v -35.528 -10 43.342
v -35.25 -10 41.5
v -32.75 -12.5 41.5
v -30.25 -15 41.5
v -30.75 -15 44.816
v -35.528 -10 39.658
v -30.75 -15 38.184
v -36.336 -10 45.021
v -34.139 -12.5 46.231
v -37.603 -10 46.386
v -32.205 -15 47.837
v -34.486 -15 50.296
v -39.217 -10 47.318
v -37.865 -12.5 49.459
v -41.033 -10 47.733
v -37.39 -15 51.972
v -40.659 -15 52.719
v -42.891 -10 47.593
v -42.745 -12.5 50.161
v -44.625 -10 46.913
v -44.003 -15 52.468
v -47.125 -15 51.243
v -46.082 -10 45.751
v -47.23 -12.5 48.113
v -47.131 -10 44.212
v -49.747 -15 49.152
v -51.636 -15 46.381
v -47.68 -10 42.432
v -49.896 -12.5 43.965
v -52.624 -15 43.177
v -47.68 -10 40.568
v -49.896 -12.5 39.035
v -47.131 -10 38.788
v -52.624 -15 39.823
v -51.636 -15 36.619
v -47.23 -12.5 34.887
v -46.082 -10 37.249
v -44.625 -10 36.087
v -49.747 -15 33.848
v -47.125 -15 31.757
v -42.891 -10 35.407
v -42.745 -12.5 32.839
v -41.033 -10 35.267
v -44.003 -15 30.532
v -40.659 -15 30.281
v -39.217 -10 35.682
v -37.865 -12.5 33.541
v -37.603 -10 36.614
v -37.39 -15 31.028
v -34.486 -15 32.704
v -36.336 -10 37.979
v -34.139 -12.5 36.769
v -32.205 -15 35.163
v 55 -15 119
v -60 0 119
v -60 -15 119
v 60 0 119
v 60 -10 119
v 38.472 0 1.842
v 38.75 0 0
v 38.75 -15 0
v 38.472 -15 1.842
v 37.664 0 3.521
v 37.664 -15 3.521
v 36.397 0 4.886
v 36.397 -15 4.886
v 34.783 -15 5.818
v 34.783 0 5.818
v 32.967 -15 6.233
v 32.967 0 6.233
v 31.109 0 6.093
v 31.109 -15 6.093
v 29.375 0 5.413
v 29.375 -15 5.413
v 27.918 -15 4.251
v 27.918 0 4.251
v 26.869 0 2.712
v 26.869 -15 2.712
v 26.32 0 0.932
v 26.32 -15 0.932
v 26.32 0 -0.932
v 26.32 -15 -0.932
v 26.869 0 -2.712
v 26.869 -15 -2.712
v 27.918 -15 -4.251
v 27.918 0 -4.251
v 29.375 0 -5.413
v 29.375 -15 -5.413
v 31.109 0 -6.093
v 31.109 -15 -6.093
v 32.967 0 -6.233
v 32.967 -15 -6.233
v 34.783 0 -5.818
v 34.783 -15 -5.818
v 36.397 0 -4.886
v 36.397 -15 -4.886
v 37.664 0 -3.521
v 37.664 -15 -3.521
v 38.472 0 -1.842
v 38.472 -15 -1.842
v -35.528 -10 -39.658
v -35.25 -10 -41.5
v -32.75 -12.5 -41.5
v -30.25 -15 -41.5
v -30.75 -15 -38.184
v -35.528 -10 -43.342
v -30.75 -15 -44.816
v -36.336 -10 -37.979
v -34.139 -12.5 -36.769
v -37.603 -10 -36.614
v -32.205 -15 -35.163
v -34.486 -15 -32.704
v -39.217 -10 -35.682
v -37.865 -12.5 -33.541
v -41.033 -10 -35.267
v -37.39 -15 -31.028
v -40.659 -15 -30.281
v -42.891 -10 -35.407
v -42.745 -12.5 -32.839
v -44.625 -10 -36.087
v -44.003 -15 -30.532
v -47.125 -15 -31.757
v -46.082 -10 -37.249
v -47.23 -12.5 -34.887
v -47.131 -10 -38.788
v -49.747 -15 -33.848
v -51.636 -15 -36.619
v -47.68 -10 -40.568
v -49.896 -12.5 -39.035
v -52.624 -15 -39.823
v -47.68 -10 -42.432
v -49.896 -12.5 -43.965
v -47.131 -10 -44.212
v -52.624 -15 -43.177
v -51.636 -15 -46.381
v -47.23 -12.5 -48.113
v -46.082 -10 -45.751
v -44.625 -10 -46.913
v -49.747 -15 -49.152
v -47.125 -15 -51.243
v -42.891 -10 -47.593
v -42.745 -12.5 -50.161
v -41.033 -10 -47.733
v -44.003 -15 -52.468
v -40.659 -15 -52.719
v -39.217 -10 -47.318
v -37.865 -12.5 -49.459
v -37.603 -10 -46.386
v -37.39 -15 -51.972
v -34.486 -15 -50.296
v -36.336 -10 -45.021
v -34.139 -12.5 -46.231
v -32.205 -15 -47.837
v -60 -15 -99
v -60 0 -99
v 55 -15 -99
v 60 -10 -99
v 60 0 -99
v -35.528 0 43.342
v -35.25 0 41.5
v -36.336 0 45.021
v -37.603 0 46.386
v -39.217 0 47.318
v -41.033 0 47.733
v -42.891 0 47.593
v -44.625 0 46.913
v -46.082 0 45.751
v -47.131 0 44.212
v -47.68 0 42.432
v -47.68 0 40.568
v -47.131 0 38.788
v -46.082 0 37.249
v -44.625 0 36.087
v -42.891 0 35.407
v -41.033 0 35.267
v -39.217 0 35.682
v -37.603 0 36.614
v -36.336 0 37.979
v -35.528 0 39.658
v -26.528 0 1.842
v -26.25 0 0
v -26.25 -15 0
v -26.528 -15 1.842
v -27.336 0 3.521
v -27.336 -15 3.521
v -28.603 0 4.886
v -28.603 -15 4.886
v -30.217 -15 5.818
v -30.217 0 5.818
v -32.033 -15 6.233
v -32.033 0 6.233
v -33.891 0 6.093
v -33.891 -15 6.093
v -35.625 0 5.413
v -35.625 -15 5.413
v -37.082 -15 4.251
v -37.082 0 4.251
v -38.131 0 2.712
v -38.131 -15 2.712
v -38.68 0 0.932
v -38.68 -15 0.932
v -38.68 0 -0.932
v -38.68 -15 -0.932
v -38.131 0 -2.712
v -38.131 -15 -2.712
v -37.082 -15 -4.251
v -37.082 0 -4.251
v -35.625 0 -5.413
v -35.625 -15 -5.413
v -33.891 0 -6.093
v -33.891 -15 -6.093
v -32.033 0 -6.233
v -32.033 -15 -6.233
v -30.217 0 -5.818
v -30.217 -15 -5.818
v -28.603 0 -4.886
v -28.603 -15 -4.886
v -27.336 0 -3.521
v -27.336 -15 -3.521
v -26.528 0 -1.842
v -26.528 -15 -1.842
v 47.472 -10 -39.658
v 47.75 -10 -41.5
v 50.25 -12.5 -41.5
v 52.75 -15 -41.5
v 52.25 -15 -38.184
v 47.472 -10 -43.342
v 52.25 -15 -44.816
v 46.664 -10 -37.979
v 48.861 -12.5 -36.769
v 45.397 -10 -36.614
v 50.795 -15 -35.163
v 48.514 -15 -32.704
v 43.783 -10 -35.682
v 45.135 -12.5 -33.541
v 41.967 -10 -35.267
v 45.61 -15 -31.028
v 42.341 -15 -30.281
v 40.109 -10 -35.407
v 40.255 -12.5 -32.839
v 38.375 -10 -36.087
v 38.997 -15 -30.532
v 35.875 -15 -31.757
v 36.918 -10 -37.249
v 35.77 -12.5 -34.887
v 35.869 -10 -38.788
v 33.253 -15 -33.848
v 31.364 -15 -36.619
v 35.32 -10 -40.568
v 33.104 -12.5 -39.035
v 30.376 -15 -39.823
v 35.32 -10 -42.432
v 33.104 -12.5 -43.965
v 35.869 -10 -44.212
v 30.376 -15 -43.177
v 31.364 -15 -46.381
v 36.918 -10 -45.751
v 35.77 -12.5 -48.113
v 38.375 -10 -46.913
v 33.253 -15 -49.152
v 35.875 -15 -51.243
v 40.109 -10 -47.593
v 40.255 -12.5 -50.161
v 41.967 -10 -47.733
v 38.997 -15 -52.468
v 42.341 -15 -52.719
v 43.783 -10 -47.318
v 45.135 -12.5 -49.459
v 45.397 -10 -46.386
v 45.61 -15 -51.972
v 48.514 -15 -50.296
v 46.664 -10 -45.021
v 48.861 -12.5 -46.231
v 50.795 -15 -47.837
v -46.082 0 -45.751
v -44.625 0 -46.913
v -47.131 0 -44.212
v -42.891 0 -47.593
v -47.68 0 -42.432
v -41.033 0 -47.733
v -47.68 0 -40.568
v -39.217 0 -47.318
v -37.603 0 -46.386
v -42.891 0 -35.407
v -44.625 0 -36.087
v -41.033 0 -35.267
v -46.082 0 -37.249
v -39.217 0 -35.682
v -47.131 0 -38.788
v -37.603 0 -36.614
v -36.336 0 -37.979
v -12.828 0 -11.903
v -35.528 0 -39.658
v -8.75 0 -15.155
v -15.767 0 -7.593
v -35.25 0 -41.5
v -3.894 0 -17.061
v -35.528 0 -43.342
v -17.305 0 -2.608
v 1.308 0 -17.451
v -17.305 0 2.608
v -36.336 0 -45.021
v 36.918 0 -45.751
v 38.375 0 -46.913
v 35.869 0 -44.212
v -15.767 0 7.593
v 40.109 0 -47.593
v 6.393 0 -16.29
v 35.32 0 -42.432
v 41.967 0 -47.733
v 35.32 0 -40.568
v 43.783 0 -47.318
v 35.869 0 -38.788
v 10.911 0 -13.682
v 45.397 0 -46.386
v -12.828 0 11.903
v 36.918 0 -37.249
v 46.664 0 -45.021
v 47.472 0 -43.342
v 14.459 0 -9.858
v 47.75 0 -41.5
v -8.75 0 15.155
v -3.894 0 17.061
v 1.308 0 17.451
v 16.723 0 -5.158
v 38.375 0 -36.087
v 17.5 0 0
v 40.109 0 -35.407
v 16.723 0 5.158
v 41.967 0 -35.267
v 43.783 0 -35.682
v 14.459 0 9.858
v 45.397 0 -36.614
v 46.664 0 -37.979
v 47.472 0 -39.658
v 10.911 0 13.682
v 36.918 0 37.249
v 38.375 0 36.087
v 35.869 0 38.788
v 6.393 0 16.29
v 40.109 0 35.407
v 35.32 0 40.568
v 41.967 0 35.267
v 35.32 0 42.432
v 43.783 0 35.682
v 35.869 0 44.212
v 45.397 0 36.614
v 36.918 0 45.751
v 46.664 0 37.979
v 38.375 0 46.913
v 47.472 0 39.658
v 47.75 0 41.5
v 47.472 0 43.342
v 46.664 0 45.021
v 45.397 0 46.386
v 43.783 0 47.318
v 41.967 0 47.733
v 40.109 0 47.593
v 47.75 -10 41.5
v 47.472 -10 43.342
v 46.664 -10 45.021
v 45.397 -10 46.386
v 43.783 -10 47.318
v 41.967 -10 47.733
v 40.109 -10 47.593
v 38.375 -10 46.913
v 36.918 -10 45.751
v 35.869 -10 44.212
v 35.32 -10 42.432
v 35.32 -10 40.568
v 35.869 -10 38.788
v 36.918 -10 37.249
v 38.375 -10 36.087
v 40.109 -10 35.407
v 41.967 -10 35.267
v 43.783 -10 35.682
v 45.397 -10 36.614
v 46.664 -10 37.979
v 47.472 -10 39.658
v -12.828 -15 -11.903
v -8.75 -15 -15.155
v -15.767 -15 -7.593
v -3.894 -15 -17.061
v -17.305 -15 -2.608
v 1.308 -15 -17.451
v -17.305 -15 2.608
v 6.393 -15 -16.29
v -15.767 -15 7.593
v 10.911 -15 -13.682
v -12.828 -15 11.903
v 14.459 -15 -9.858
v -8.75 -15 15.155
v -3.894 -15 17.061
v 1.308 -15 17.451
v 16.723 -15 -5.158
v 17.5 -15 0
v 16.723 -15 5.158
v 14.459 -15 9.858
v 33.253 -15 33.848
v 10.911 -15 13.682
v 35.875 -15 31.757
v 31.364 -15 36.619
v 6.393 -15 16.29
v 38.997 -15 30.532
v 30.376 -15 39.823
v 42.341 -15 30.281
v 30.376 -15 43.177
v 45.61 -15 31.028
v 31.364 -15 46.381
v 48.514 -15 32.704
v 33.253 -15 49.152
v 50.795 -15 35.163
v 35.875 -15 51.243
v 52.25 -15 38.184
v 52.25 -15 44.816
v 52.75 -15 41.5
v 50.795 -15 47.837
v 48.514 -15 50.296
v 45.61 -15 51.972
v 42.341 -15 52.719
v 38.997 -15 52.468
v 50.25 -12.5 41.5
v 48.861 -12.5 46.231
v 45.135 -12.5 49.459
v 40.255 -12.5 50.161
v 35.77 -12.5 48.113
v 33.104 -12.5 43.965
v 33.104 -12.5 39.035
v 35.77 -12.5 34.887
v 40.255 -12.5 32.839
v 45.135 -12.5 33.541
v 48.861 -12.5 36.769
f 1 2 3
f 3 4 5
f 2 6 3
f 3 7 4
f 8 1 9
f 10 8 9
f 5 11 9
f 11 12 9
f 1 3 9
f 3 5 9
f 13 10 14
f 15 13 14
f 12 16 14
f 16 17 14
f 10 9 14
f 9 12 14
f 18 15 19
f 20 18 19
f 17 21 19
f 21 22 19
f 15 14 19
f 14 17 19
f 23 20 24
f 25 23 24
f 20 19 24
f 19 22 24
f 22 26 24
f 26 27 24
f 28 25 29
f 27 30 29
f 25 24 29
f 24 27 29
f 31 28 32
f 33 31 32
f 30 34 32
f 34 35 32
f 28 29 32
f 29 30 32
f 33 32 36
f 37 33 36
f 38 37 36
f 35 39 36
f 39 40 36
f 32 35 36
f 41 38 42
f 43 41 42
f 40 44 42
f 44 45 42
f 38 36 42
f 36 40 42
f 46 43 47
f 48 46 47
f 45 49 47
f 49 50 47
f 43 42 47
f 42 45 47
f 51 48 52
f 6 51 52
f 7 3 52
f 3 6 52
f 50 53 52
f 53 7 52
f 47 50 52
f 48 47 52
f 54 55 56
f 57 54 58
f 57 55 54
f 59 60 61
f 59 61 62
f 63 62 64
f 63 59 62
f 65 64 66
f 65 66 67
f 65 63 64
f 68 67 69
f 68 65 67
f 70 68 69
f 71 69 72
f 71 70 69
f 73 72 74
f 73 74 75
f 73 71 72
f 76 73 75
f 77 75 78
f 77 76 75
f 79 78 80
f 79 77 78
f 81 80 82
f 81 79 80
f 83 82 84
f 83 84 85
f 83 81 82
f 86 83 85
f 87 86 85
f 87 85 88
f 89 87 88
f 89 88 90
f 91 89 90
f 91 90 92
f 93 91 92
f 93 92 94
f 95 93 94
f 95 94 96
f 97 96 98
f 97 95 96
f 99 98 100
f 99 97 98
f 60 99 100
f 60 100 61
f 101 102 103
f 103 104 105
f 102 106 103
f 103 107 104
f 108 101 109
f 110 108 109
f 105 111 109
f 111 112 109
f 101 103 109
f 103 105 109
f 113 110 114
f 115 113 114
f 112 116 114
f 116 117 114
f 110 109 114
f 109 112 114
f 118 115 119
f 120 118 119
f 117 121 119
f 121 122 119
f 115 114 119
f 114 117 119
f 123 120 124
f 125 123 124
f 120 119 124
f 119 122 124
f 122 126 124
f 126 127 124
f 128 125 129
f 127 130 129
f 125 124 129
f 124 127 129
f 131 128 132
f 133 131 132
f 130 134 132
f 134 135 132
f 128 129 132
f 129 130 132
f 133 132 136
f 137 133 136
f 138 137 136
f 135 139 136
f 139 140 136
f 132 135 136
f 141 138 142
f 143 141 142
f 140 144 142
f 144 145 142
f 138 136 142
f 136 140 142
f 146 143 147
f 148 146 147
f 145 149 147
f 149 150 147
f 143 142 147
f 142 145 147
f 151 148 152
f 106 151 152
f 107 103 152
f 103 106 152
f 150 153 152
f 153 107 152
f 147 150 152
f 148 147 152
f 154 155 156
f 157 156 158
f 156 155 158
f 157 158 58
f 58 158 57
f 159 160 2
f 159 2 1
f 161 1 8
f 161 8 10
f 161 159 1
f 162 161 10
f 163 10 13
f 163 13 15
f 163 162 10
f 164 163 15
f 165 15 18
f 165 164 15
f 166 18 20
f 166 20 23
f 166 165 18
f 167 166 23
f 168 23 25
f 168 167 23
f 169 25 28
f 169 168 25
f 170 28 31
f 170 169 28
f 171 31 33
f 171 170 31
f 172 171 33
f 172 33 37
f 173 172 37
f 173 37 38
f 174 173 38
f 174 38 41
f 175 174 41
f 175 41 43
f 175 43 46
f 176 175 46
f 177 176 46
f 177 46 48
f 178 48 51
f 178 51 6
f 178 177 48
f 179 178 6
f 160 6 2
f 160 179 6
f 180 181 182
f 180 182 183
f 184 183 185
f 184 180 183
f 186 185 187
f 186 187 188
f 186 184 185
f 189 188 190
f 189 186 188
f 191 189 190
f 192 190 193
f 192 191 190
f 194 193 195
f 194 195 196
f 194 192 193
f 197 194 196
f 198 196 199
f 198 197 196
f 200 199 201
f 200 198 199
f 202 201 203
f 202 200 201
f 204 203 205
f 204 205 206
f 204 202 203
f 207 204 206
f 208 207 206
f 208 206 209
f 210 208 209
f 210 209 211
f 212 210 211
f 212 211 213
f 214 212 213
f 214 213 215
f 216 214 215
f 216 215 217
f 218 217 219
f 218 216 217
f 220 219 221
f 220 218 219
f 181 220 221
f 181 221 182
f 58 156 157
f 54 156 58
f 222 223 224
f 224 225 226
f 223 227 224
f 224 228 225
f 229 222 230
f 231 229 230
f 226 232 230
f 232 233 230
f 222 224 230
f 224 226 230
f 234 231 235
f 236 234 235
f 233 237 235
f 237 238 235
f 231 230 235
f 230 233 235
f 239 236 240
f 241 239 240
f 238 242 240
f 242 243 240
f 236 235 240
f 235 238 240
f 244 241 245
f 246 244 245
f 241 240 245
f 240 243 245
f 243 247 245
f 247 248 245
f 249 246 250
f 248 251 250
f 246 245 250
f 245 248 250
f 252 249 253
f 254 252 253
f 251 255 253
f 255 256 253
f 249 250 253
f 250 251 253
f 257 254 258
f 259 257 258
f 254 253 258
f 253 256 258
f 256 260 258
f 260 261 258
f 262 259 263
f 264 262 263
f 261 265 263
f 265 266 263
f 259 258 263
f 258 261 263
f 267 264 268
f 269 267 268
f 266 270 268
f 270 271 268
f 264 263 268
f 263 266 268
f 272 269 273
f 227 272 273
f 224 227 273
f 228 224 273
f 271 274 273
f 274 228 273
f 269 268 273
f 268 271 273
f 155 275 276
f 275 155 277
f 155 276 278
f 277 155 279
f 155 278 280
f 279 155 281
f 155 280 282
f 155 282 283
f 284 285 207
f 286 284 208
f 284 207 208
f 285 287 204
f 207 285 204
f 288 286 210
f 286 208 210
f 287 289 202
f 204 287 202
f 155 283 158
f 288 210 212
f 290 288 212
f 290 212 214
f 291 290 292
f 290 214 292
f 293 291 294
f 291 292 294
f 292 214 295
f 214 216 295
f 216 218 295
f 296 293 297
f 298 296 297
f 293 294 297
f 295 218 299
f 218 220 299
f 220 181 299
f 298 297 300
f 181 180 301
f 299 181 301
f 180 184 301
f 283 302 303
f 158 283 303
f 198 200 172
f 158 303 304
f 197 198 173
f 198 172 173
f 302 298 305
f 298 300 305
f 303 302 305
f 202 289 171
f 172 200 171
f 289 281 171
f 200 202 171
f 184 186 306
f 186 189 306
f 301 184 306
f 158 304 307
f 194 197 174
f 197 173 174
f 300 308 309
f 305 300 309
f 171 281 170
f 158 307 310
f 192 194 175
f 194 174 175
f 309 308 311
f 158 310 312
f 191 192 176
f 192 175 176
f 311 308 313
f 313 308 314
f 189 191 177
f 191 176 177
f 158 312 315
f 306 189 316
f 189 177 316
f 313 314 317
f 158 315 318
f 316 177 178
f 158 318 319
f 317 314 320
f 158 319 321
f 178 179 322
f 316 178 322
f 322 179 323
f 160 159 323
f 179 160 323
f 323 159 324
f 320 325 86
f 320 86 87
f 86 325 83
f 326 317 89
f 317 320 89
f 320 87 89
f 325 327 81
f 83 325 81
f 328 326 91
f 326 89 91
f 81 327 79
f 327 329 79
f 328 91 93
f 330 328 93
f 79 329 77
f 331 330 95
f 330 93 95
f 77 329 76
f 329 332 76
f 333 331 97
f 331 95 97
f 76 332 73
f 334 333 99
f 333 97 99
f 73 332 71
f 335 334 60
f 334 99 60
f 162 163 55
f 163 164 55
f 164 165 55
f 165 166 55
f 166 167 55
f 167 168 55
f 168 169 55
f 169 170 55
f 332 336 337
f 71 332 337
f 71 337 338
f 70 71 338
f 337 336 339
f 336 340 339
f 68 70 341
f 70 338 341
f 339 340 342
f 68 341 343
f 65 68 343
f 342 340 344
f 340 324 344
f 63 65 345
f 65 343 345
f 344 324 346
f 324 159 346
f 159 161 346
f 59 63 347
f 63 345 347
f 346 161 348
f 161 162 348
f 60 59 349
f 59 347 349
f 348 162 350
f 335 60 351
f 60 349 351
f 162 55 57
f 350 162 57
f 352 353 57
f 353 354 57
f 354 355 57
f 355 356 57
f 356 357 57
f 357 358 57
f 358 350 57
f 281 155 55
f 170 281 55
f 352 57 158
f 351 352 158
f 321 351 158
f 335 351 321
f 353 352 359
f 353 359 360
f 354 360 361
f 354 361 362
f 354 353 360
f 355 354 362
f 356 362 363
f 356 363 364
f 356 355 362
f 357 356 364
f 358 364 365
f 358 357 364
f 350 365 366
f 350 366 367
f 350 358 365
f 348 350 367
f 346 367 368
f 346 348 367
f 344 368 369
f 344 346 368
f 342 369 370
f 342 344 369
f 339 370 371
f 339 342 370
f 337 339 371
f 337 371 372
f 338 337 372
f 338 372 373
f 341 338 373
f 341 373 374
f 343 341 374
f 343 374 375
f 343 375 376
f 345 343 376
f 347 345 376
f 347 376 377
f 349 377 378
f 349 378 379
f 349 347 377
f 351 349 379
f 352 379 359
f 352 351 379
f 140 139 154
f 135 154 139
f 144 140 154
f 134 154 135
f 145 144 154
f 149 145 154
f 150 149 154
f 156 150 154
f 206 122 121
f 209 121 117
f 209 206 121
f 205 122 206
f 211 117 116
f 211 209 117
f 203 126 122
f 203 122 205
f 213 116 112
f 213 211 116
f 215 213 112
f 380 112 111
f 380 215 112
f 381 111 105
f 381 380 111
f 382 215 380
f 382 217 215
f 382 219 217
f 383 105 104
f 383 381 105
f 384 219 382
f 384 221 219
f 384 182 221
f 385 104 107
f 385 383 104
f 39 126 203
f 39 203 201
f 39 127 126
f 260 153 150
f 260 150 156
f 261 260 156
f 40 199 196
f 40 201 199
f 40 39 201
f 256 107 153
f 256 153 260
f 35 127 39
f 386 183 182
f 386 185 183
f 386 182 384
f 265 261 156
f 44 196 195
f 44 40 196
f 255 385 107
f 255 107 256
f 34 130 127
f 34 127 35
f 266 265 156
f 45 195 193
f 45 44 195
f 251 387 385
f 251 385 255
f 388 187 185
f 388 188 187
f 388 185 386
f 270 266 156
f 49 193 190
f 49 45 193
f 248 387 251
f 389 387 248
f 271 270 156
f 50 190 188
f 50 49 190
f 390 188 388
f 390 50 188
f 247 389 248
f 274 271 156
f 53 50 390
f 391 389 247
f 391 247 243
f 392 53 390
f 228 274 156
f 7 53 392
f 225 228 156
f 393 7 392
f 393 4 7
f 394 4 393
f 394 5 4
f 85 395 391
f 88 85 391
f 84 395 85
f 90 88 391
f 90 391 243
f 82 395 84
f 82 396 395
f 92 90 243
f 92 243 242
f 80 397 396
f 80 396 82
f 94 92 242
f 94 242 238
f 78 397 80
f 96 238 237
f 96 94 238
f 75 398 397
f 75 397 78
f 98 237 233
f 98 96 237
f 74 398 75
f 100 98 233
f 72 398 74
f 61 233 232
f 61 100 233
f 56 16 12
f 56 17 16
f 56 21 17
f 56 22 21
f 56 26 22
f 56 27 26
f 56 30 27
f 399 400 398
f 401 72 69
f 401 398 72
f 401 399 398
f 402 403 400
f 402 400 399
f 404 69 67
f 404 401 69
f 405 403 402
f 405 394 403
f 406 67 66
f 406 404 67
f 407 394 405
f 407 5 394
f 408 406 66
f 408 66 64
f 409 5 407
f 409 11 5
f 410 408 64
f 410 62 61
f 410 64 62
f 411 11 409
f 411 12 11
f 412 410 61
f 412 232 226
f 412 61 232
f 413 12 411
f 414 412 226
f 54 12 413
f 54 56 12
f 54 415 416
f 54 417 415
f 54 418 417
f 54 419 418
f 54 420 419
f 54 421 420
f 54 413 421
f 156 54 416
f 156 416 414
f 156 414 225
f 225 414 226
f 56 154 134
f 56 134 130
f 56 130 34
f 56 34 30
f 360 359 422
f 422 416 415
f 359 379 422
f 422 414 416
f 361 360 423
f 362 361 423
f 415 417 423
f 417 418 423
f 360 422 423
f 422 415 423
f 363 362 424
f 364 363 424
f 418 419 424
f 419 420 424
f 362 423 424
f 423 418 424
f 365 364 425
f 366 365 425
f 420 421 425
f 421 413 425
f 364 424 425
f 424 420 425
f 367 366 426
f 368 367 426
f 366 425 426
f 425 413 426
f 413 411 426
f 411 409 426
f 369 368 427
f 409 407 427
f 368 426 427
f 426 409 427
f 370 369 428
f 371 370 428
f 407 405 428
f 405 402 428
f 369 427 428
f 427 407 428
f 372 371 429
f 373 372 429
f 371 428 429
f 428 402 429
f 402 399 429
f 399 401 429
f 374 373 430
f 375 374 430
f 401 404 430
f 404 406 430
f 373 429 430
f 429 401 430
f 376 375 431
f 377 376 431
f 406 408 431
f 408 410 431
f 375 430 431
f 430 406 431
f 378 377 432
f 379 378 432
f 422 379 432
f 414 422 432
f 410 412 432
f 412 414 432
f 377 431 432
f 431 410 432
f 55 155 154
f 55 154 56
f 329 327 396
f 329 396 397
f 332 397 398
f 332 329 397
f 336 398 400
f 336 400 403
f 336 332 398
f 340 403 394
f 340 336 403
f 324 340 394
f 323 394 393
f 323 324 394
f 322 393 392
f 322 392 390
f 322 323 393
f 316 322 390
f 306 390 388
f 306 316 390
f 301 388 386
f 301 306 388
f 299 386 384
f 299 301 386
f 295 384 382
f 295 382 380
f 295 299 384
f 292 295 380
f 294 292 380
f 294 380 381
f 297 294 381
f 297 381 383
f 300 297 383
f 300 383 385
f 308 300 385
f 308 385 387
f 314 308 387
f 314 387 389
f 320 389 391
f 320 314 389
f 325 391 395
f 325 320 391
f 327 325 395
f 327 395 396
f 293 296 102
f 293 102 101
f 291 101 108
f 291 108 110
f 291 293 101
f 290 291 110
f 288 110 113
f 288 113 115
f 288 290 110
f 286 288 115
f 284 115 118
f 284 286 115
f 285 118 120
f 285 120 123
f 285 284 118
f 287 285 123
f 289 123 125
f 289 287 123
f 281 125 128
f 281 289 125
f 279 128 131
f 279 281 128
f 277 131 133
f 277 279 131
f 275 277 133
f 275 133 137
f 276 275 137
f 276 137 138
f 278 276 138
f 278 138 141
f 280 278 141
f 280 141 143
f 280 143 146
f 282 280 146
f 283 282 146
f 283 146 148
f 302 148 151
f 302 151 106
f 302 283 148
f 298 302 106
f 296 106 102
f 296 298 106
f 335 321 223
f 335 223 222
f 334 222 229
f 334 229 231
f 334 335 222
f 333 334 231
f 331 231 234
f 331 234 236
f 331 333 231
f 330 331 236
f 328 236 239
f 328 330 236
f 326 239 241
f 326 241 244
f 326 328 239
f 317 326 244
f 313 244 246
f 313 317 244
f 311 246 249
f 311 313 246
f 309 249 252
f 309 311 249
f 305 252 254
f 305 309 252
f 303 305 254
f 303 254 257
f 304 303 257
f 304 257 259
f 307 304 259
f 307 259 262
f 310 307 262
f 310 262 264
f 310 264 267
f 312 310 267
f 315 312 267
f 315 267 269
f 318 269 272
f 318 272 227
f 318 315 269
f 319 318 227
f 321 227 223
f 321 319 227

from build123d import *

# Parameters (mm, degrees)
F0_W     = 120
F0_H     = 218
F0_R     = 6.25
F0_R_2   = 17.5
F1_DEPTH = 15
F2_SIZE2 = 5
F2_SIZE  = 5


with BuildPart() as f1:
    # F0 (on Front) → F1 (new body)
    with BuildSketch(Plane.XZ):
        with Locations((0, 10)):
            Rectangle(F0_W, F0_H)
        with Locations((-41.5, -41.5)):
            Circle(F0_R, mode=Mode.SUBTRACT)
        with Locations((-32.5, 0)):
            Circle(F0_R, mode=Mode.SUBTRACT)
        Circle(F0_R_2, mode=Mode.SUBTRACT)
        with Locations((41.5, -41.5)):
            Circle(F0_R, mode=Mode.SUBTRACT)
        with Locations((32.5, 0)):
            Circle(F0_R, mode=Mode.SUBTRACT)
        with Locations((-41.5, 41.5)):
            Circle(F0_R, mode=Mode.SUBTRACT)
        with Locations((41.5, 41.5)):
            Circle(F0_R, mode=Mode.SUBTRACT)
    extrude(amount=F1_DEPTH)

    # F2
    f2_edges = [f1.edges().sort_by_distance(p)[0] for p in [
        (-47.75, -15, 41.5),
        (35.25, -15, 41.5),
        (-47.75, -15, -41.5),
        (35.25, -15, -41.5),
        (60, -15, 10),
    ]]
    chamfer(f2_edges, length=F2_SIZE, length2=F2_SIZE2)


solid = f1.part
